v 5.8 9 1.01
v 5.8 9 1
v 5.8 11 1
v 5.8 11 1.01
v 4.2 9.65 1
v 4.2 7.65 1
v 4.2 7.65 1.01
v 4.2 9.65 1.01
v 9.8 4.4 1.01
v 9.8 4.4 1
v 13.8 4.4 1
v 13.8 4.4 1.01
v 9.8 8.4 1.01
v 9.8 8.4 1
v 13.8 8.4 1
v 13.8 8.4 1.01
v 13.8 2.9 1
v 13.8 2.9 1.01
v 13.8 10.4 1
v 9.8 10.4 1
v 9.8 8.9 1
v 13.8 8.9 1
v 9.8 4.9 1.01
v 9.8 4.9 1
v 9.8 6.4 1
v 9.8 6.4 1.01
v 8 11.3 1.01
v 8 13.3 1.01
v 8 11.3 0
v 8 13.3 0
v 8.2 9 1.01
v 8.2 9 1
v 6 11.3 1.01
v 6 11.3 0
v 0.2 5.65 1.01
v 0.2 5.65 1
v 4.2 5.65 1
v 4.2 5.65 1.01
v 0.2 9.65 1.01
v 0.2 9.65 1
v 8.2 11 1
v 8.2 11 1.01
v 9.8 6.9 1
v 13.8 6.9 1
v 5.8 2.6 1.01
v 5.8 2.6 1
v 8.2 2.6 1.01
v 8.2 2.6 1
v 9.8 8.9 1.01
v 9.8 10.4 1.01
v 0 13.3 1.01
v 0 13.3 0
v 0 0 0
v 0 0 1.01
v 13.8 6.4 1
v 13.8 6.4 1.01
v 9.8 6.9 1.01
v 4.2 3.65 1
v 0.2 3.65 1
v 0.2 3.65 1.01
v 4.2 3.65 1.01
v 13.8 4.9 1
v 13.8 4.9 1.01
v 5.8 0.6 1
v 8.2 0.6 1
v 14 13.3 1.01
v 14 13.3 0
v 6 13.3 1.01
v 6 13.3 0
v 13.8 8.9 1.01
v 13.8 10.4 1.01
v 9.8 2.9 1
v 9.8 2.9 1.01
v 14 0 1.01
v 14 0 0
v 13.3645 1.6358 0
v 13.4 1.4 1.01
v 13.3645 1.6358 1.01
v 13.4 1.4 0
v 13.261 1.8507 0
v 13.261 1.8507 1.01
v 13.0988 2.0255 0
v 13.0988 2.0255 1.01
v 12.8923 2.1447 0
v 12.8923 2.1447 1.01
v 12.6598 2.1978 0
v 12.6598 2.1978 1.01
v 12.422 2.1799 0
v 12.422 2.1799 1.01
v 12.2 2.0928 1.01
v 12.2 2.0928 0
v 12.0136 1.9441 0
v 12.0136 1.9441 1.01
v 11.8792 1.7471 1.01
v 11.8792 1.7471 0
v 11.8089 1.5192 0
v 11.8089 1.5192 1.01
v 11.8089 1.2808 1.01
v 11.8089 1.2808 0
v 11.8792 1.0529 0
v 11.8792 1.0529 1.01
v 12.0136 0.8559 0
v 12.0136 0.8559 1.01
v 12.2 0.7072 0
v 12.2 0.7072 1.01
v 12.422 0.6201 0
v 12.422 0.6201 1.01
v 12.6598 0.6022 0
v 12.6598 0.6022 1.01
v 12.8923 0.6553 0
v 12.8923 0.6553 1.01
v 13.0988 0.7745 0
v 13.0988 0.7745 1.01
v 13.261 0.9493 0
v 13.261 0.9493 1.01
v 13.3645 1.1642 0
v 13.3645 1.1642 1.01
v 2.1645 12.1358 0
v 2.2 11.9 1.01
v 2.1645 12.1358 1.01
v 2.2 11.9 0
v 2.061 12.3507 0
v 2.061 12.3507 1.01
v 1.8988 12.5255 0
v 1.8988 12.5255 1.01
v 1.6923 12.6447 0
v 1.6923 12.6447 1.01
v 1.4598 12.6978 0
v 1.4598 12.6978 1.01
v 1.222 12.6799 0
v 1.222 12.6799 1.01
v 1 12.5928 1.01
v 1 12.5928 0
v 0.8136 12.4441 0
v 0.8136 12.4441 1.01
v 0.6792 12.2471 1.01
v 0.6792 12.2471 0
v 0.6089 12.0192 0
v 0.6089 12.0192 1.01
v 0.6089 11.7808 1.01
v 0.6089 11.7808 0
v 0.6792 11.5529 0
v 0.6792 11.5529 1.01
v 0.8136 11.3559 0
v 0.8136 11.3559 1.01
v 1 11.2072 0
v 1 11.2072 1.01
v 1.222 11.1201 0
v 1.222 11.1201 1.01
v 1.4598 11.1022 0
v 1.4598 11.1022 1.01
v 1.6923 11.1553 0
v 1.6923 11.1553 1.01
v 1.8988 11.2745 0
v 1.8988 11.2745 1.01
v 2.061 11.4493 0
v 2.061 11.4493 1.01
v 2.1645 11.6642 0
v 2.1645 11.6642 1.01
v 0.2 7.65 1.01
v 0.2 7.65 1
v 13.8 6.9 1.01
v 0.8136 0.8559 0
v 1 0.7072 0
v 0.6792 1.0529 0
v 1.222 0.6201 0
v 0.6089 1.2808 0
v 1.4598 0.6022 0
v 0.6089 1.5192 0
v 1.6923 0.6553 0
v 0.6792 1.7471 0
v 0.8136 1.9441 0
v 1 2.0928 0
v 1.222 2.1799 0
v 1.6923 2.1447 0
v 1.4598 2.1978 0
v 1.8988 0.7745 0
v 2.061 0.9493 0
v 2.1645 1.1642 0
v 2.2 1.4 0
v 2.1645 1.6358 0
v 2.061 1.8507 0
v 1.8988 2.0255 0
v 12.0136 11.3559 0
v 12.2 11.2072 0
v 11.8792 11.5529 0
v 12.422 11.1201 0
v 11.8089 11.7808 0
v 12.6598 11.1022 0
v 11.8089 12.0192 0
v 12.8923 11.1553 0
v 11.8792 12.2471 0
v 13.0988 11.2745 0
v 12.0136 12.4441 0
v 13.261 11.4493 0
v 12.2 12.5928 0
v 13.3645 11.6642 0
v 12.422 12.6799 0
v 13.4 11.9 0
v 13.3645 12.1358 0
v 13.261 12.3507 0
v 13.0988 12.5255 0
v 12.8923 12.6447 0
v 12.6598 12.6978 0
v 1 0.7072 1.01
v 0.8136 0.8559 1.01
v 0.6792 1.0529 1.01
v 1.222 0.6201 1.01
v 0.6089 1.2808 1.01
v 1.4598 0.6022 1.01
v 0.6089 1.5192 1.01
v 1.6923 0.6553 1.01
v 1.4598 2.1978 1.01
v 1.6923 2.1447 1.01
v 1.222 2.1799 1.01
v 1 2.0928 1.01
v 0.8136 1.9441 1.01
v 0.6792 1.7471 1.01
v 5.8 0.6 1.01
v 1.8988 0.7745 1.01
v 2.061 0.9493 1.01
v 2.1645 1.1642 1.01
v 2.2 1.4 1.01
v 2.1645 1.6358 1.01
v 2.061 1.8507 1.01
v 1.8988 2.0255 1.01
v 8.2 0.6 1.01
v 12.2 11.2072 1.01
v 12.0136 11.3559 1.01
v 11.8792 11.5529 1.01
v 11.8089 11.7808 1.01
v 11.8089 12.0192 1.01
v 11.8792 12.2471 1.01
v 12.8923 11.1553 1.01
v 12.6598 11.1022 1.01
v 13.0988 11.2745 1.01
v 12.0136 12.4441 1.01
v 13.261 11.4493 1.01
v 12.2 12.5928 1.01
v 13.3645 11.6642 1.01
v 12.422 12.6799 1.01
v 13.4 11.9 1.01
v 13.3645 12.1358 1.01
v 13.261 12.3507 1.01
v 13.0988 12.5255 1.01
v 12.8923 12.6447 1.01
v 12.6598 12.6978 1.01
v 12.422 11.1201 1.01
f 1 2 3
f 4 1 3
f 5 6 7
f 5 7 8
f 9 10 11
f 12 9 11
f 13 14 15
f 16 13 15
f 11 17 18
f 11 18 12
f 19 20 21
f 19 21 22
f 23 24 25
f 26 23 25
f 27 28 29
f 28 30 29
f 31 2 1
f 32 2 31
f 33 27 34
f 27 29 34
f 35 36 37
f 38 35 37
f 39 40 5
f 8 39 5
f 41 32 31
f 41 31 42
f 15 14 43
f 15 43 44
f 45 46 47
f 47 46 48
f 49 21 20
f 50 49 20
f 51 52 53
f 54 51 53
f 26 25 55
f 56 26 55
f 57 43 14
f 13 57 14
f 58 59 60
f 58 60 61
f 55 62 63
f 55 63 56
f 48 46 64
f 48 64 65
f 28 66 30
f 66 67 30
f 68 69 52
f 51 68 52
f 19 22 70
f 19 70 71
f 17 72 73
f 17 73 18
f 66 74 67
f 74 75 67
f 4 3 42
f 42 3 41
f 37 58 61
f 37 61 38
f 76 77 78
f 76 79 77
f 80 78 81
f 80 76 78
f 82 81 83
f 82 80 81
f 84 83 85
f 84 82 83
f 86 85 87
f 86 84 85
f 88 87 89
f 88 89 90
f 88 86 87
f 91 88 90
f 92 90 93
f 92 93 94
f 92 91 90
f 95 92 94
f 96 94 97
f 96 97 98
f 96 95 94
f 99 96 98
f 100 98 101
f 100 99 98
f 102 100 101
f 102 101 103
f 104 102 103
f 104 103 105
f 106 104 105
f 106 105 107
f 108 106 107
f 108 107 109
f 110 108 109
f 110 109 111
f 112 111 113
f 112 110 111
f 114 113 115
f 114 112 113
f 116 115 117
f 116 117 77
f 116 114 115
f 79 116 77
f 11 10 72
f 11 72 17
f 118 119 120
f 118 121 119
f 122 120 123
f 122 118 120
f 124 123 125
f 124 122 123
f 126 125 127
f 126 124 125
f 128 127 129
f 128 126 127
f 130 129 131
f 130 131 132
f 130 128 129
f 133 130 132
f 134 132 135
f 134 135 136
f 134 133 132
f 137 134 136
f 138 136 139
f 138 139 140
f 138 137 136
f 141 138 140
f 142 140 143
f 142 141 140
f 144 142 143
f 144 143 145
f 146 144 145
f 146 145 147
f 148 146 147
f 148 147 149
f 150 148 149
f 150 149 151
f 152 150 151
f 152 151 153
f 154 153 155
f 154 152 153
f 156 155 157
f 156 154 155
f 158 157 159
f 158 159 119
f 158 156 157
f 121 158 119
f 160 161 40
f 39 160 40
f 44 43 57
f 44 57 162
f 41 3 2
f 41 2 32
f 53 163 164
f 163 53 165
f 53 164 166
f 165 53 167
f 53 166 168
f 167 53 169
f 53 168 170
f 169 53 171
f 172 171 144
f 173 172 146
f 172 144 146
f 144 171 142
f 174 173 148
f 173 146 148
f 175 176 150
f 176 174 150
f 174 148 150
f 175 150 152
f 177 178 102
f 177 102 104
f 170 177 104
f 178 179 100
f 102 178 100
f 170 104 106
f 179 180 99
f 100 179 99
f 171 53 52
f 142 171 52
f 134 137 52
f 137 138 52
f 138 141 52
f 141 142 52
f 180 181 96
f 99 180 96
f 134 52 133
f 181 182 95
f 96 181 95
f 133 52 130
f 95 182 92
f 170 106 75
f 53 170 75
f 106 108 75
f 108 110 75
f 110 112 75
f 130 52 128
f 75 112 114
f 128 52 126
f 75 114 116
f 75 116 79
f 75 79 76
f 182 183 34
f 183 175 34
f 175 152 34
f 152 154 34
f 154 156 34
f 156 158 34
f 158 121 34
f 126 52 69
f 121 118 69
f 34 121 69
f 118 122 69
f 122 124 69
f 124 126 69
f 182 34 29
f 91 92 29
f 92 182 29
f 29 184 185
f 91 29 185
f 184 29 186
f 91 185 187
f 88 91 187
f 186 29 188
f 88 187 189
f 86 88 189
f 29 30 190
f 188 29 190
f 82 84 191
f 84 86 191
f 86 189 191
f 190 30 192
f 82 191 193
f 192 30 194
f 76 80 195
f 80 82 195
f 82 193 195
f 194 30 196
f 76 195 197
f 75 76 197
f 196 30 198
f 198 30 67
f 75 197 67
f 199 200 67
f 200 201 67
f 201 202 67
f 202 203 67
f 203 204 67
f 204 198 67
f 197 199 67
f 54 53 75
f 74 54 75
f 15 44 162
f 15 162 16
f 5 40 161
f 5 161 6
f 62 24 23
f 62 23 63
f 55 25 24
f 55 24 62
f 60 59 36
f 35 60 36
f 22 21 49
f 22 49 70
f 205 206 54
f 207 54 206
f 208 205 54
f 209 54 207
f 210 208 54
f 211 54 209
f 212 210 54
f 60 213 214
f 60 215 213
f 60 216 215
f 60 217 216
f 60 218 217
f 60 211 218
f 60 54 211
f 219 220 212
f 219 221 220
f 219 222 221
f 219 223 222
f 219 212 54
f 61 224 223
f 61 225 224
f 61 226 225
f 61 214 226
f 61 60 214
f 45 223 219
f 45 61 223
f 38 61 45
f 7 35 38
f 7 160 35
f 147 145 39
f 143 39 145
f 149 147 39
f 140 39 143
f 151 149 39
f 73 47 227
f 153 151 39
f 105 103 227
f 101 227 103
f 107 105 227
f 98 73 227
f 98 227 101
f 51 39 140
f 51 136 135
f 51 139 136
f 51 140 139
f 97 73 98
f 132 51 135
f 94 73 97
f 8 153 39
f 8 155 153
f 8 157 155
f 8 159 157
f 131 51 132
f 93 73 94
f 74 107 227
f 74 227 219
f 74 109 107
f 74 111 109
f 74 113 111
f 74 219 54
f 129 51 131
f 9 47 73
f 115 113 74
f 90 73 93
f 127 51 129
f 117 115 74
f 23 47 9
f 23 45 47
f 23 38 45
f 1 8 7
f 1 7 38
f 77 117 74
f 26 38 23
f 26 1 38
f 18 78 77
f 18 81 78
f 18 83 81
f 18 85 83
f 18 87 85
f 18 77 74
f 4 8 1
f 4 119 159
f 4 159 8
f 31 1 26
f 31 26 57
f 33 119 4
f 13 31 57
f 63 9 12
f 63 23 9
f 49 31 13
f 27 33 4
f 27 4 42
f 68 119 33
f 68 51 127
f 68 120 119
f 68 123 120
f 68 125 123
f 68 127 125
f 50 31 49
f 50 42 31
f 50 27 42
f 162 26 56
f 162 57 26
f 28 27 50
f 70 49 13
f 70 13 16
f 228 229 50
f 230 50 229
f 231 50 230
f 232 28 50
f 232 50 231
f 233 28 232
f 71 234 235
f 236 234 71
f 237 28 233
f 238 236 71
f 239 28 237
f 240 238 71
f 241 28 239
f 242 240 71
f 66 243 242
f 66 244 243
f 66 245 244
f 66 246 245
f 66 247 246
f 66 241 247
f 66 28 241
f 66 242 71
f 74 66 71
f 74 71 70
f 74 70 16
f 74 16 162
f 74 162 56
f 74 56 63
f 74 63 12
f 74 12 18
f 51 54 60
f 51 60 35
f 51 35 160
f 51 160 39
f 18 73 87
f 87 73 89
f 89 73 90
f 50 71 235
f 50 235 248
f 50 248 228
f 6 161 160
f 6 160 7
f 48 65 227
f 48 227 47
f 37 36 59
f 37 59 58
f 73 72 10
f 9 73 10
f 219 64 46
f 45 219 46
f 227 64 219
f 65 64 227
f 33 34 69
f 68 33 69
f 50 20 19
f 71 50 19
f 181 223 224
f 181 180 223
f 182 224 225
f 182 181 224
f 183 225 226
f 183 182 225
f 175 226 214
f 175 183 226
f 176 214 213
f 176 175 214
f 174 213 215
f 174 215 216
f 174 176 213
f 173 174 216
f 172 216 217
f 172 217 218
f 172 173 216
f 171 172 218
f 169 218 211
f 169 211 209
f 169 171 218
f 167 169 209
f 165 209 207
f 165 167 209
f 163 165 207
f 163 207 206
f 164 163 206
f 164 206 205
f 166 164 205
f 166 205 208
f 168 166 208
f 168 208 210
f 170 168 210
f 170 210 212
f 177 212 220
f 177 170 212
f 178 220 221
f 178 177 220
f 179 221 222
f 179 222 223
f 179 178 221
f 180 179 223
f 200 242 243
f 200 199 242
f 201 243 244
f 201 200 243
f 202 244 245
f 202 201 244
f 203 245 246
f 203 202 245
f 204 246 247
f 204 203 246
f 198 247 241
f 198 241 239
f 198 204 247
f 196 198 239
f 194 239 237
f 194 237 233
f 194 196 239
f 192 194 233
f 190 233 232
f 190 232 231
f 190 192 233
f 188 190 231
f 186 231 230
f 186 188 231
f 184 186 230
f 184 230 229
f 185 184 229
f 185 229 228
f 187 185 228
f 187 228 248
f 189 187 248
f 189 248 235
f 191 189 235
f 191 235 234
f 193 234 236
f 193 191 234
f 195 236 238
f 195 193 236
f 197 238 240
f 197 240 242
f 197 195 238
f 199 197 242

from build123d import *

# Parameters (mm, degrees)
SKETCH_1_R      = 0.8
EXTRUDE_2_DEPTH = 1
SKETCH_2_R      = 0.8
SKETCH_2_W      = 4
SKETCH_2_H      = 2
SKETCH_2_W_2    = 2.4
SKETCH_2_H_2    = 1.5
EXTRUDE_3_DEPTH = 0.01


with BuildPart() as part:
    # 草图1 → 凸台-拉伸2 (new body)
    with BuildSketch(Plane.XY):
        Polygon((0, 13.3), (0, 0), (14, 0), (14, 13.3), (8, 13.3), (8, 11.3), (6, 11.3), (6, 13.3), align=None)
        with Locations((1.4, 1.4)):
            Circle(SKETCH_1_R, mode=Mode.SUBTRACT)
        with Locations((12.6, 1.4)):
            Circle(SKETCH_1_R, mode=Mode.SUBTRACT)
        with Locations((1.4, 11.9)):
            Circle(SKETCH_1_R, mode=Mode.SUBTRACT)
        with Locations((12.6, 11.9)):
            Circle(SKETCH_1_R, mode=Mode.SUBTRACT)
    extrude(amount=EXTRUDE_2_DEPTH)

    # 草图2 → 凸台-拉伸3 (add)
    with BuildSketch(Plane.XY.offset(1)):
        Polygon((0, 0), (14, 0), (14, 13.3), (8, 13.3), (8, 11.3), (6, 11.3), (6, 13.3), (0, 13.3), align=None)
        with Locations((1.4, 1.4)):
            Circle(SKETCH_2_R, mode=Mode.SUBTRACT)
        with Locations((2.2, 4.65)):
            Rectangle(SKETCH_2_W, SKETCH_2_H, mode=Mode.SUBTRACT)
        with Locations((7, 1.6)):
            Rectangle(SKETCH_2_W_2, SKETCH_2_H, mode=Mode.SUBTRACT)
        with Locations((12.6, 1.4)):
            Circle(SKETCH_2_R, mode=Mode.SUBTRACT)
        with Locations((11.8, 3.65)):
            Rectangle(SKETCH_2_W, SKETCH_2_H_2, mode=Mode.SUBTRACT)
        with Locations((11.8, 5.65)):
            Rectangle(SKETCH_2_W, SKETCH_2_H_2, mode=Mode.SUBTRACT)
        with Locations((2.2, 8.65)):
            Rectangle(SKETCH_2_W, SKETCH_2_H, mode=Mode.SUBTRACT)
        with Locations((1.4, 11.9)):
            Circle(SKETCH_2_R, mode=Mode.SUBTRACT)
        with Locations((11.8, 7.65)):
            Rectangle(SKETCH_2_W, SKETCH_2_H_2, mode=Mode.SUBTRACT)
        with Locations((11.8, 9.65)):
            Rectangle(SKETCH_2_W, SKETCH_2_H_2, mode=Mode.SUBTRACT)
        with Locations((7, 10)):
            Rectangle(SKETCH_2_W_2, SKETCH_2_H, mode=Mode.SUBTRACT)
        with Locations((12.6, 11.9)):
            Circle(SKETCH_2_R, mode=Mode.SUBTRACT)
    extrude(amount=EXTRUDE_3_DEPTH)


solid = part.part
